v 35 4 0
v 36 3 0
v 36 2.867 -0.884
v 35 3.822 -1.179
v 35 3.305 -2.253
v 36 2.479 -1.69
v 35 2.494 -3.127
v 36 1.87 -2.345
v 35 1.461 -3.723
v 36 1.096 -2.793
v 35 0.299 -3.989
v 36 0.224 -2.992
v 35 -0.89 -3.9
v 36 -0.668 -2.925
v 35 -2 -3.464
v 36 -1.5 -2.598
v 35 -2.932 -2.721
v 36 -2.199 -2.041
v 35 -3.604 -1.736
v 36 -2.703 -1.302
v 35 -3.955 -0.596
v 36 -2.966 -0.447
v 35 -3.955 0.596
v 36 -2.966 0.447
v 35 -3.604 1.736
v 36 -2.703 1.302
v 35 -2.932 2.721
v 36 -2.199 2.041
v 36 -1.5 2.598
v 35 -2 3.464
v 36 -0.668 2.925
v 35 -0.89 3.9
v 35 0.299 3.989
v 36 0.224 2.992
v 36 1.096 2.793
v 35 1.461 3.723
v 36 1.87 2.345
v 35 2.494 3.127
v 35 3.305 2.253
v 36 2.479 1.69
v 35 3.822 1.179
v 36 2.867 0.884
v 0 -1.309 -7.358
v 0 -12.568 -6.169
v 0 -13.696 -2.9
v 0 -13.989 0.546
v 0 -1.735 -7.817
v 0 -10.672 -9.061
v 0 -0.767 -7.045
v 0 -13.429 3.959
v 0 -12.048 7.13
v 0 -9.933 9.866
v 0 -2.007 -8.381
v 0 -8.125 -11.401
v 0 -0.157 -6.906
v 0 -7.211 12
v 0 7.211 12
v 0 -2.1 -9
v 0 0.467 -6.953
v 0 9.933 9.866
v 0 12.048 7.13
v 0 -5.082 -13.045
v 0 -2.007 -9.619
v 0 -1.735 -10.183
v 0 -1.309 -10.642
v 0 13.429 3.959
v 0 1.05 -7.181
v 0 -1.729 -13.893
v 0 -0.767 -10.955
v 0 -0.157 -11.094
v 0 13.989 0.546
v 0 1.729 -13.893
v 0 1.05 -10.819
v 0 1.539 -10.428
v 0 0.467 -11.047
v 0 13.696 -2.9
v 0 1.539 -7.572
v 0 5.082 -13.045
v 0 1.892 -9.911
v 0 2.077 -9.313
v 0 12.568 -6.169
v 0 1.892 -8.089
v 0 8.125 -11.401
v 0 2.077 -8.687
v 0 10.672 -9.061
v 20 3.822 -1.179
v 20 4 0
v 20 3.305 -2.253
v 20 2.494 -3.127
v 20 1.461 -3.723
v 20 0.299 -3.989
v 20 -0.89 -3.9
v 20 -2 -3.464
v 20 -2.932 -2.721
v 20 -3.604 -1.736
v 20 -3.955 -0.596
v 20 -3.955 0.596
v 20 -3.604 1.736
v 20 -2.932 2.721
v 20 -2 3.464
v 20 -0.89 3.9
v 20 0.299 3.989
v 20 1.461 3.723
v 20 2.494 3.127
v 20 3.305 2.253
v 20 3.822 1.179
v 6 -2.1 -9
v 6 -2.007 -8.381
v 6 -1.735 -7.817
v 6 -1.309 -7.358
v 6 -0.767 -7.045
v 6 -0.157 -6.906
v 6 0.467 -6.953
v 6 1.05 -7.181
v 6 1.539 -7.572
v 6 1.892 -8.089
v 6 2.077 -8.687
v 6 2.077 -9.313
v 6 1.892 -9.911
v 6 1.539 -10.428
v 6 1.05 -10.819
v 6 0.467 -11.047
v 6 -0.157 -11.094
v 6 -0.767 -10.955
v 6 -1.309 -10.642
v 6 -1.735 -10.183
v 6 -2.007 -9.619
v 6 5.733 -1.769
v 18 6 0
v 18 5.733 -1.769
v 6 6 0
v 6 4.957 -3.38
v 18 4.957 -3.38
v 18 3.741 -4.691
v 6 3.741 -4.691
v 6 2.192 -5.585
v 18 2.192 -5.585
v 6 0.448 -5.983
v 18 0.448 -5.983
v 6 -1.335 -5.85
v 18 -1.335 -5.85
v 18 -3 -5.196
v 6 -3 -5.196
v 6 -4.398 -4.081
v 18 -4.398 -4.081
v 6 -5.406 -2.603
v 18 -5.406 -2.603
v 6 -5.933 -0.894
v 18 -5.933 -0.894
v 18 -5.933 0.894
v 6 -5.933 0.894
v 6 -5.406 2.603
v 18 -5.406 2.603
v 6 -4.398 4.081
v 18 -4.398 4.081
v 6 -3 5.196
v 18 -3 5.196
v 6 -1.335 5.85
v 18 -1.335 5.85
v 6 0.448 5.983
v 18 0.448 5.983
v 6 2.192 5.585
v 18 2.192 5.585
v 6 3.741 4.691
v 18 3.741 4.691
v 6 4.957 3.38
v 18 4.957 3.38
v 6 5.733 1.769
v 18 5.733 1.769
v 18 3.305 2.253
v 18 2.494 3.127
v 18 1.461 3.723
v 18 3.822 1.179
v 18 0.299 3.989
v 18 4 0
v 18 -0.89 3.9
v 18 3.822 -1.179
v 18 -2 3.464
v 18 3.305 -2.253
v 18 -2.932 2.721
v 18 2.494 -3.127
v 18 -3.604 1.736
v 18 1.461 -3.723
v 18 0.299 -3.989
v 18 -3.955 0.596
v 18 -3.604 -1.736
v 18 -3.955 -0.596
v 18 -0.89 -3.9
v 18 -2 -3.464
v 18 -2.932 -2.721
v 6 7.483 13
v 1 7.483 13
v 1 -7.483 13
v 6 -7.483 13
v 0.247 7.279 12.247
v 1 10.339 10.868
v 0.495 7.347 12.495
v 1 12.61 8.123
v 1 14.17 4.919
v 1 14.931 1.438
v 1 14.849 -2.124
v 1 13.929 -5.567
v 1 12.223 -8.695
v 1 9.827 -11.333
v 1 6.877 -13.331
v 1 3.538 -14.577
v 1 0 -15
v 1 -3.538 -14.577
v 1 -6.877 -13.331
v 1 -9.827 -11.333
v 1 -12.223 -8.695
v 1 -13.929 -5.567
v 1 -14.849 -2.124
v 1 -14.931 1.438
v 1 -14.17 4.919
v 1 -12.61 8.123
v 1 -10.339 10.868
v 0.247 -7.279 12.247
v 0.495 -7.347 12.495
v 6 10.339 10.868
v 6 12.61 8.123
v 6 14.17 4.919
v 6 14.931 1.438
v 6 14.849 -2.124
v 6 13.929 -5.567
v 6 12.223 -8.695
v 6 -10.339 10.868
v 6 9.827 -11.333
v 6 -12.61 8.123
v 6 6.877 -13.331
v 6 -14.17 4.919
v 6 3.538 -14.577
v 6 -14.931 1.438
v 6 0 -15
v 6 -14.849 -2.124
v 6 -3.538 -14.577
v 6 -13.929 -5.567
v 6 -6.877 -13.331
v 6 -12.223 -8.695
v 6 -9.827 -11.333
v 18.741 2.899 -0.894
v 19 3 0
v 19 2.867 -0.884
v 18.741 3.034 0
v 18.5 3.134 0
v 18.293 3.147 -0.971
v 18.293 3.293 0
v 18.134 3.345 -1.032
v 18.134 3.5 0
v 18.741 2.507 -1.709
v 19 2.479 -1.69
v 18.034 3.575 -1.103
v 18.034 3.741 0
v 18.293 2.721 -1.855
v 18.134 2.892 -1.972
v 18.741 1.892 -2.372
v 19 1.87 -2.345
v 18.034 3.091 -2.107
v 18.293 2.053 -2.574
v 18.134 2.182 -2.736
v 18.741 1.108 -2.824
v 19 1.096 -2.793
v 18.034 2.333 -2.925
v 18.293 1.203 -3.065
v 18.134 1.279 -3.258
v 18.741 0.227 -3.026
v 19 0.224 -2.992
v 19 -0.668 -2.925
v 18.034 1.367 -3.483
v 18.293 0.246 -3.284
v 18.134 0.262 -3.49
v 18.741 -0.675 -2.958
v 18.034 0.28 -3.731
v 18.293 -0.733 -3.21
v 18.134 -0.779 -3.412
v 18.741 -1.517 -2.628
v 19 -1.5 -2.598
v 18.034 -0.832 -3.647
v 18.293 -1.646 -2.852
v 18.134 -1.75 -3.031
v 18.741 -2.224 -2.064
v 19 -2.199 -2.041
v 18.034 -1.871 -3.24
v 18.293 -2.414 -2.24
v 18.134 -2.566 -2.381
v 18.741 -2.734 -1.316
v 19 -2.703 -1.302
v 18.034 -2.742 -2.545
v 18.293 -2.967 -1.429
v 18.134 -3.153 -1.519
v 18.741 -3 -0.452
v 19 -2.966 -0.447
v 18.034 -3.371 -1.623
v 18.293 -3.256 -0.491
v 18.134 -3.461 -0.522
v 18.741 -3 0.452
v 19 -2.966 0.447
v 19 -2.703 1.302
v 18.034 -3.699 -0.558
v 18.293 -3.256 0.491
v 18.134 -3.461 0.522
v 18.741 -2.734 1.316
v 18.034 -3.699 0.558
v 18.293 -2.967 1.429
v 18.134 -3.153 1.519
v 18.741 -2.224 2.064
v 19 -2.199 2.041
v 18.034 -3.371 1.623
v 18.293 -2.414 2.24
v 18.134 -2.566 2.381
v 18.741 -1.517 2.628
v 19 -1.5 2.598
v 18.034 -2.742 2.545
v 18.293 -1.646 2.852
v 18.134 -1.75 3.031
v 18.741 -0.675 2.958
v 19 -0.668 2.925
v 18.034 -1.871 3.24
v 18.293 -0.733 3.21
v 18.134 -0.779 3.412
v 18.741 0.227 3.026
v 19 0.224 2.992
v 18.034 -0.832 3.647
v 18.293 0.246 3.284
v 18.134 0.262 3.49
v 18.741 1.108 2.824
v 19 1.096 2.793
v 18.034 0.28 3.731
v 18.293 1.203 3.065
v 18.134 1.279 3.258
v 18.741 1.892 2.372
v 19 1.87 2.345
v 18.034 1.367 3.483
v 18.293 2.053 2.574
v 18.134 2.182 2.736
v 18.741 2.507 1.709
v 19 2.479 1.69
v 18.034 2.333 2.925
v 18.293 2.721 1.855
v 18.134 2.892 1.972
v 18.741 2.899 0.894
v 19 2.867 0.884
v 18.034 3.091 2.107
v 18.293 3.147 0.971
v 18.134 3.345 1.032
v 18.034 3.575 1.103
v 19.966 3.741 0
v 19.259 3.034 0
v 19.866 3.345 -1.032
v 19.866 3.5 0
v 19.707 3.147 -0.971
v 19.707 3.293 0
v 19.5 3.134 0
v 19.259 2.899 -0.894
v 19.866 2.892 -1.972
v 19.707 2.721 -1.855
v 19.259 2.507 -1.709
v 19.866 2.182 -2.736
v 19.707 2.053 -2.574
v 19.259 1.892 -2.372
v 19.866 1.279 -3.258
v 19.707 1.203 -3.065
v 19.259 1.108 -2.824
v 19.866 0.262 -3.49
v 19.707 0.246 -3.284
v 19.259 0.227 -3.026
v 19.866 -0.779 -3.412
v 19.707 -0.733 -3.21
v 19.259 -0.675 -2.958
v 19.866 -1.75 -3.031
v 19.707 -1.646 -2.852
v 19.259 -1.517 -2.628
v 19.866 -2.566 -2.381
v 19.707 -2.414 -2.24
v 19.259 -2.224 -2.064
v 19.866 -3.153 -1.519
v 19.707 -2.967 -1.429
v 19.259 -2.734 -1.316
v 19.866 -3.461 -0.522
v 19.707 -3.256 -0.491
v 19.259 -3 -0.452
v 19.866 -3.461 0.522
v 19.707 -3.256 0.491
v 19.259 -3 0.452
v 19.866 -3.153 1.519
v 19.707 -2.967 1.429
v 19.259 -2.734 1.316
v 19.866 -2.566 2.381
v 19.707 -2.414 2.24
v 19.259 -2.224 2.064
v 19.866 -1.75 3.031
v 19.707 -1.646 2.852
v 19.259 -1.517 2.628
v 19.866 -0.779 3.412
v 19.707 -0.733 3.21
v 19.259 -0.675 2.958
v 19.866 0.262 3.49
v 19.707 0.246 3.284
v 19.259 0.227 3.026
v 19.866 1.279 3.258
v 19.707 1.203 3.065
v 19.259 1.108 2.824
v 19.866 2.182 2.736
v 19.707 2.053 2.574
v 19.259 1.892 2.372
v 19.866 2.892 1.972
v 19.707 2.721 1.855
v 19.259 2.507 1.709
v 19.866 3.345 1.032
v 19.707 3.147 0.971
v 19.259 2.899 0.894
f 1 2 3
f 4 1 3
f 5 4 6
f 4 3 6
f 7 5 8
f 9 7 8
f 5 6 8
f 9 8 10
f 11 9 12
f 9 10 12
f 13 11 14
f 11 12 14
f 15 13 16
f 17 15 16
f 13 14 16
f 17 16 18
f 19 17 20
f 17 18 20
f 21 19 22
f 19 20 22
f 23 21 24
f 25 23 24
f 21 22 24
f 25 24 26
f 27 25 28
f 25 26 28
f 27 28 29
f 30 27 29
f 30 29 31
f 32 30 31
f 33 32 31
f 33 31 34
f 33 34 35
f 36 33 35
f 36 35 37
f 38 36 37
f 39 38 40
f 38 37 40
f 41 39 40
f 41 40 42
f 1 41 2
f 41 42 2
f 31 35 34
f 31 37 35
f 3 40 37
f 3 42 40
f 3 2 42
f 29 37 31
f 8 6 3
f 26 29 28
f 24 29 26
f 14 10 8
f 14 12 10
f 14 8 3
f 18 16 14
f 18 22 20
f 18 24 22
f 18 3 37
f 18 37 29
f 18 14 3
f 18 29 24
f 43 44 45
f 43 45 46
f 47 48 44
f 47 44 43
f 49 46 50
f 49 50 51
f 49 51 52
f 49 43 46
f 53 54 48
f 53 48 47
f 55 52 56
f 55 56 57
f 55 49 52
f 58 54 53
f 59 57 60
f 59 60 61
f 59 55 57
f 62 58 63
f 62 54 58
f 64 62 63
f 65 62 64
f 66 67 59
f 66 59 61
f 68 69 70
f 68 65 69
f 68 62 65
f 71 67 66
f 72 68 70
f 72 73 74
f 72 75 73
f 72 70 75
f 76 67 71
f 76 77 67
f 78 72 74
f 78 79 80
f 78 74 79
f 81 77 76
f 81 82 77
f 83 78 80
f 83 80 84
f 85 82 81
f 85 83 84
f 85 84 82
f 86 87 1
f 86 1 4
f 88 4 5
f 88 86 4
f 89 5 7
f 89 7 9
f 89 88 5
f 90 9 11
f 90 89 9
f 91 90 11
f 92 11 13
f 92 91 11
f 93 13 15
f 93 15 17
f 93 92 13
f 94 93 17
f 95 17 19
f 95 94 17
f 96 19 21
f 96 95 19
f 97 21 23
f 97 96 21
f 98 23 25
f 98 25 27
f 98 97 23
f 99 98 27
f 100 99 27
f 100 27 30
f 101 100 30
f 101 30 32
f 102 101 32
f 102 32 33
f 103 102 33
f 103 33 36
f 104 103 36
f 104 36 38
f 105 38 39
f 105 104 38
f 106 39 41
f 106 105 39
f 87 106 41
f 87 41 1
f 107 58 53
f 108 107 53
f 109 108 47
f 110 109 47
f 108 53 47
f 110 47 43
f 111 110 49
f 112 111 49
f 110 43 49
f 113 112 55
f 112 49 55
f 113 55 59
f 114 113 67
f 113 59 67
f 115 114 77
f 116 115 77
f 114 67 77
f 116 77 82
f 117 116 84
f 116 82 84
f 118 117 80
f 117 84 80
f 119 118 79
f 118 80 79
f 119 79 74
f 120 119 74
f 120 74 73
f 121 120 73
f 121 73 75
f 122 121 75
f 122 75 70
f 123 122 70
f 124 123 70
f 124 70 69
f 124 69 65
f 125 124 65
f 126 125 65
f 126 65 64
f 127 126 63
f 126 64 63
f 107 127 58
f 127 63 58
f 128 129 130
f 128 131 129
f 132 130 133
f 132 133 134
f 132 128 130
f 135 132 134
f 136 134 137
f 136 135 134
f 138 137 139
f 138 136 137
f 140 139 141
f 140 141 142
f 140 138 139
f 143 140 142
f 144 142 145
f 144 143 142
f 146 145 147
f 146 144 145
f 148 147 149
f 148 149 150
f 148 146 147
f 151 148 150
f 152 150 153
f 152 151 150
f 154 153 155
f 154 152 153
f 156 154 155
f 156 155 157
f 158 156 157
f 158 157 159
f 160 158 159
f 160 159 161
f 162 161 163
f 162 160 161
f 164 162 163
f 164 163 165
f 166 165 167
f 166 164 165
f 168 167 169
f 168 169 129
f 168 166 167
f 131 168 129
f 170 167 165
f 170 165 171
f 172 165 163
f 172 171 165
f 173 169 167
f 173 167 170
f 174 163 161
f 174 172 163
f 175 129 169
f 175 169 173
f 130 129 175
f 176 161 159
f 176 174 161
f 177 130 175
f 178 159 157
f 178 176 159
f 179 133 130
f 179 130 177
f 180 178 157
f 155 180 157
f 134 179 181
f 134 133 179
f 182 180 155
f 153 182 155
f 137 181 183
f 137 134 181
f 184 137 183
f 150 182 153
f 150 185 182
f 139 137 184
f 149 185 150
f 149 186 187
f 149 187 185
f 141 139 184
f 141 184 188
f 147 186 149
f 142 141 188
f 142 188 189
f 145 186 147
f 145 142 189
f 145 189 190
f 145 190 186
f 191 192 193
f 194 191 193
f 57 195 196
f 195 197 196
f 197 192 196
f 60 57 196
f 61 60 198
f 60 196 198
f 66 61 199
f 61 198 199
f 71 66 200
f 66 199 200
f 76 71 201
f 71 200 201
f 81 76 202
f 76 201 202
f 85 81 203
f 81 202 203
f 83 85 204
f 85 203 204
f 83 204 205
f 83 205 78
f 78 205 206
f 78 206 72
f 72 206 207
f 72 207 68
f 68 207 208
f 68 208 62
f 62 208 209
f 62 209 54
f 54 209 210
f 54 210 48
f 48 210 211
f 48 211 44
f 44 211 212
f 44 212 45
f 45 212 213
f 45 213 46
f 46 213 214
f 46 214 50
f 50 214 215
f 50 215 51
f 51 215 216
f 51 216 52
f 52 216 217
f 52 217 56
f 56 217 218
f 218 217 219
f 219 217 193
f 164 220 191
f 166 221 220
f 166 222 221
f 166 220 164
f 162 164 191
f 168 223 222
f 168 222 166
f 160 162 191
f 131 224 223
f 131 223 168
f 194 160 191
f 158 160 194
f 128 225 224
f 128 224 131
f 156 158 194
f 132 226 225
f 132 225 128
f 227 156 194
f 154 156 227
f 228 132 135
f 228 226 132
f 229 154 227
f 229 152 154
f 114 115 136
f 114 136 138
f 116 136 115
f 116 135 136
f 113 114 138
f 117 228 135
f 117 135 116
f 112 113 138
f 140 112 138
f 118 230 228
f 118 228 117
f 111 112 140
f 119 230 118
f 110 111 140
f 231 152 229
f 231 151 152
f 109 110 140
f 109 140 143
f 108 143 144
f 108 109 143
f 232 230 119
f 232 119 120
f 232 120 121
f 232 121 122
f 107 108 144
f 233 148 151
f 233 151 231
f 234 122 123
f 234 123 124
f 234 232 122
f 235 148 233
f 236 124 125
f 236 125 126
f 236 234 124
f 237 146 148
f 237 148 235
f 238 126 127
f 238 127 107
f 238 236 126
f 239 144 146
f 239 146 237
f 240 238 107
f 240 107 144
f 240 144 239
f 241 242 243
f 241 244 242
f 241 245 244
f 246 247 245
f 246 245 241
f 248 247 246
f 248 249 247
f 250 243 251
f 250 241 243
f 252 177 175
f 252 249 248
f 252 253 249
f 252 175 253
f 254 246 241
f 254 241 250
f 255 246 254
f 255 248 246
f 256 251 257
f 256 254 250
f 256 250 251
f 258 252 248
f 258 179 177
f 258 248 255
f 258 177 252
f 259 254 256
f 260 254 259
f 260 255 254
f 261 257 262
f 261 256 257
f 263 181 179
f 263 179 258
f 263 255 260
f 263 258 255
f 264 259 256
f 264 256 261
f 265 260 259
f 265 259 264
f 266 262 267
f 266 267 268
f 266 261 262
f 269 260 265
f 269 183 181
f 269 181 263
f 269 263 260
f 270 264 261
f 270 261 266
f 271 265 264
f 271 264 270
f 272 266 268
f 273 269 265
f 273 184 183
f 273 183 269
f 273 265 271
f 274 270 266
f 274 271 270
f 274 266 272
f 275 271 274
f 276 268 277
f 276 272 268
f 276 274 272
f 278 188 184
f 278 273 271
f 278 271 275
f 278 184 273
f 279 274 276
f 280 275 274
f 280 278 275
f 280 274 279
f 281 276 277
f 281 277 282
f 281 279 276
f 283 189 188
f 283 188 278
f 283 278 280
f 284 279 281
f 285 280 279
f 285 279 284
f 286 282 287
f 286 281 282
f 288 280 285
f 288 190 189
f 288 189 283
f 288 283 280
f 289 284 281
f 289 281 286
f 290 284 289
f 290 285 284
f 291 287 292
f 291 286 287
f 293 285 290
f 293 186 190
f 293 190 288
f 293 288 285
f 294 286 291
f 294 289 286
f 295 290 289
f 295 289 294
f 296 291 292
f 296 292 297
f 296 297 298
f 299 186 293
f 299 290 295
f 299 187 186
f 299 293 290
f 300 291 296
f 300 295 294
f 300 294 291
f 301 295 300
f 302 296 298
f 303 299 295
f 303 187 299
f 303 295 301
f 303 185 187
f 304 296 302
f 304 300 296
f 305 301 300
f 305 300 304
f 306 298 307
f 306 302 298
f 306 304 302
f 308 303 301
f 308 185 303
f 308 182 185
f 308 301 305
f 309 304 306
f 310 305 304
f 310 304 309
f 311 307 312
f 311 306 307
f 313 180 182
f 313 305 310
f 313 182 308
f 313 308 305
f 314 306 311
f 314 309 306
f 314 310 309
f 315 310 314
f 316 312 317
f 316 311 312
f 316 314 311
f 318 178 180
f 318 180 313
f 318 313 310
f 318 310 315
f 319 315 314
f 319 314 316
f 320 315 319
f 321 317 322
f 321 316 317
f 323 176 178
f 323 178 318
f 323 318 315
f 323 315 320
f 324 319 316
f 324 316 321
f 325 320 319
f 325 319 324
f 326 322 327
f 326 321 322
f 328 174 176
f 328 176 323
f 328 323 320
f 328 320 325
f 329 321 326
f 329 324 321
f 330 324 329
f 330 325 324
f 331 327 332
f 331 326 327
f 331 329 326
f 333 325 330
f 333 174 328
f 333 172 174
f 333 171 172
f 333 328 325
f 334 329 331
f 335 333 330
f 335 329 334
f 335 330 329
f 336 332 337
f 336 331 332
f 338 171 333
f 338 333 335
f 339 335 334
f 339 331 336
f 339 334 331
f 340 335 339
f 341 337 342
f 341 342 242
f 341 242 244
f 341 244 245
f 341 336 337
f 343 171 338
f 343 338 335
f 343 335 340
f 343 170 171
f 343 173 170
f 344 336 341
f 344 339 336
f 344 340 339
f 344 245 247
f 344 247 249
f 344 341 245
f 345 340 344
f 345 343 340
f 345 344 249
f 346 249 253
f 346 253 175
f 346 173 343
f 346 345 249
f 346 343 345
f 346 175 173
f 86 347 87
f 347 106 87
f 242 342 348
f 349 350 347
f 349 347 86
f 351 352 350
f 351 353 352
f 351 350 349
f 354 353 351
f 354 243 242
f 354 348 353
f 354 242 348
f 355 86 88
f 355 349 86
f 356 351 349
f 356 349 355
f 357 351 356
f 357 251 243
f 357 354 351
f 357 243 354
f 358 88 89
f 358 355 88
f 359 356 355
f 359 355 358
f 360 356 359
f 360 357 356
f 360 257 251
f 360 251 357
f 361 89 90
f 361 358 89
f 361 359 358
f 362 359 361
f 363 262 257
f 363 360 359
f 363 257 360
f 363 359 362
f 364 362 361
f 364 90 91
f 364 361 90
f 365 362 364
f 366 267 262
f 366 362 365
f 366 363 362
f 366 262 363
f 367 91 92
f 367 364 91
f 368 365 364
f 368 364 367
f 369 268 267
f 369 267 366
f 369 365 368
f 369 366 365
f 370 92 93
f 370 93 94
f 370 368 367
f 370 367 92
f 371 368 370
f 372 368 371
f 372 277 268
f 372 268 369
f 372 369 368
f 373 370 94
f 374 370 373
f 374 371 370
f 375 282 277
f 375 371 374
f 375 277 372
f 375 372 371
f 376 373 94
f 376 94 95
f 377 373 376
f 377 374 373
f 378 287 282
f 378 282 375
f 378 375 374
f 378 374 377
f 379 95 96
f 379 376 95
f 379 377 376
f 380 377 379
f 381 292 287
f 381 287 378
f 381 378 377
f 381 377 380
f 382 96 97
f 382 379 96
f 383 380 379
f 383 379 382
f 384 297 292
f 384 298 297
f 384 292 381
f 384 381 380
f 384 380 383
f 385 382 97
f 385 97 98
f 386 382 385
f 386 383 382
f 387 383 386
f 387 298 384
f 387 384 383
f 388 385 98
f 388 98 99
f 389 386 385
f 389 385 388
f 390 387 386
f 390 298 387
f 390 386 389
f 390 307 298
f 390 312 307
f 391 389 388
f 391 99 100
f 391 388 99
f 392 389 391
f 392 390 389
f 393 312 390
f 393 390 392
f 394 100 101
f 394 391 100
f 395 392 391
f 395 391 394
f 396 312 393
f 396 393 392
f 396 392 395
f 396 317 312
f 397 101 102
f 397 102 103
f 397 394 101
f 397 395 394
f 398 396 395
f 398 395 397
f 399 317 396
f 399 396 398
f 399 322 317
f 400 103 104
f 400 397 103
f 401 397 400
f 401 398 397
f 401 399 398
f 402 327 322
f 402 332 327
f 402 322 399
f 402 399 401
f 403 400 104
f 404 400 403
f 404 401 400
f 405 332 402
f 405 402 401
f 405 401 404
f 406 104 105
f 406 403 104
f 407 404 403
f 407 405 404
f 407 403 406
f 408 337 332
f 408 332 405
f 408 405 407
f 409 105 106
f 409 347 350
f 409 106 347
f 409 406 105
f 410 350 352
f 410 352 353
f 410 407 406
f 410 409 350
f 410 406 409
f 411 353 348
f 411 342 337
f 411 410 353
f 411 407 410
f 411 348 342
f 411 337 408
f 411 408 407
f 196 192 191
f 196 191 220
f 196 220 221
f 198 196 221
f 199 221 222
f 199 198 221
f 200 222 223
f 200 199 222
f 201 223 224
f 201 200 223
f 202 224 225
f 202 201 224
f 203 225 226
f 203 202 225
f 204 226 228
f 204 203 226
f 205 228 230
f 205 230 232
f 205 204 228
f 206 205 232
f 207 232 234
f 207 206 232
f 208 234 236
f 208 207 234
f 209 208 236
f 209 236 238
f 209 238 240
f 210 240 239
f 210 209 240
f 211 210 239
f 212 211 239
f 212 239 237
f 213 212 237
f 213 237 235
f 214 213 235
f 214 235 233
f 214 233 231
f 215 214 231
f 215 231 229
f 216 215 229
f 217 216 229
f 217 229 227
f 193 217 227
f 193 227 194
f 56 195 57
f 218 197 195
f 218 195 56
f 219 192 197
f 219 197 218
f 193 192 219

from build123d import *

# Parameters (mm, degrees)
F3_DEPTH = 25
F4_SIZE  = 1
F5_R     = 2.1
F6_DEPTH = 6


with BuildPart() as f1:
    # F0 (on Top) → F1 (revolve)
    with BuildSketch(Plane.XY):
        with BuildLine():
            Line((0, 15), (0, 0))
            Line((0, 0), (36, 0))
            Line((36, 0), (36, 4))
            Line((36, 4), (20, 4))
            ThreePointArc((20, 4), (19.7071067812, 3.2928932188), (19, 3))
            ThreePointArc((19, 3), (18.2928932188, 3.2928932188), (18, 4))
            Line((18, 4), (18, 6))
            Line((18, 6), (6, 6))
            Line((6, 6), (6, 15))
            Line((6, 15), (0, 15))
        make_face()
    revolve(axis=Axis((18, 0, 0), (-1, 0, 0)))

    # F2 (on face) → F3 (cut)
    with BuildSketch(Plane(origin=(0, 0, 0), x_dir=(0, -1, 0), z_dir=(-1, 0, 0))):
        with BuildLine():
            Line((23.4234053642, 26.5963438079), (-25.4426617175, 26.5963438079))
            Line((-25.4426617175, 26.5963438079), (-25.4426617175, 13))
            Line((-25.4426617175, 13), (-7.4833147735, 13))
            ThreePointArc((-7.4833147735, 13), (0, 15), (7.4833147735, 13))
            Line((7.4833147735, 13), (23.4234053642, 13))
            Line((23.4234053642, 13), (23.4234053642, 26.5963438079))
        make_face()
        with BuildLine():
            ThreePointArc((7.4833147735, 13), (0, 15), (-7.4833147735, 13))
            Line((-7.4833147735, 13), (7.4833147735, 13))
        make_face()
    extrude(amount=-F3_DEPTH, mode=Mode.SUBTRACT)

    # F4
    f4_edges = [f1.edges().sort_by_distance(p)[0] for p in [
        (0, 0, -15),
        (0, 0, 13),
        (36, -4, 0),
    ]]
    chamfer(f4_edges, length=F4_SIZE)

    # F5 (on face) → F6 (cut)
    with BuildSketch(Plane(origin=(0, 0, 0), x_dir=(0, -1, 0), z_dir=(-1, 0, 0))):
        with Locations((0, -9)):
            Circle(F5_R)
    extrude(amount=-F6_DEPTH, mode=Mode.SUBTRACT)


solid = f1.part
